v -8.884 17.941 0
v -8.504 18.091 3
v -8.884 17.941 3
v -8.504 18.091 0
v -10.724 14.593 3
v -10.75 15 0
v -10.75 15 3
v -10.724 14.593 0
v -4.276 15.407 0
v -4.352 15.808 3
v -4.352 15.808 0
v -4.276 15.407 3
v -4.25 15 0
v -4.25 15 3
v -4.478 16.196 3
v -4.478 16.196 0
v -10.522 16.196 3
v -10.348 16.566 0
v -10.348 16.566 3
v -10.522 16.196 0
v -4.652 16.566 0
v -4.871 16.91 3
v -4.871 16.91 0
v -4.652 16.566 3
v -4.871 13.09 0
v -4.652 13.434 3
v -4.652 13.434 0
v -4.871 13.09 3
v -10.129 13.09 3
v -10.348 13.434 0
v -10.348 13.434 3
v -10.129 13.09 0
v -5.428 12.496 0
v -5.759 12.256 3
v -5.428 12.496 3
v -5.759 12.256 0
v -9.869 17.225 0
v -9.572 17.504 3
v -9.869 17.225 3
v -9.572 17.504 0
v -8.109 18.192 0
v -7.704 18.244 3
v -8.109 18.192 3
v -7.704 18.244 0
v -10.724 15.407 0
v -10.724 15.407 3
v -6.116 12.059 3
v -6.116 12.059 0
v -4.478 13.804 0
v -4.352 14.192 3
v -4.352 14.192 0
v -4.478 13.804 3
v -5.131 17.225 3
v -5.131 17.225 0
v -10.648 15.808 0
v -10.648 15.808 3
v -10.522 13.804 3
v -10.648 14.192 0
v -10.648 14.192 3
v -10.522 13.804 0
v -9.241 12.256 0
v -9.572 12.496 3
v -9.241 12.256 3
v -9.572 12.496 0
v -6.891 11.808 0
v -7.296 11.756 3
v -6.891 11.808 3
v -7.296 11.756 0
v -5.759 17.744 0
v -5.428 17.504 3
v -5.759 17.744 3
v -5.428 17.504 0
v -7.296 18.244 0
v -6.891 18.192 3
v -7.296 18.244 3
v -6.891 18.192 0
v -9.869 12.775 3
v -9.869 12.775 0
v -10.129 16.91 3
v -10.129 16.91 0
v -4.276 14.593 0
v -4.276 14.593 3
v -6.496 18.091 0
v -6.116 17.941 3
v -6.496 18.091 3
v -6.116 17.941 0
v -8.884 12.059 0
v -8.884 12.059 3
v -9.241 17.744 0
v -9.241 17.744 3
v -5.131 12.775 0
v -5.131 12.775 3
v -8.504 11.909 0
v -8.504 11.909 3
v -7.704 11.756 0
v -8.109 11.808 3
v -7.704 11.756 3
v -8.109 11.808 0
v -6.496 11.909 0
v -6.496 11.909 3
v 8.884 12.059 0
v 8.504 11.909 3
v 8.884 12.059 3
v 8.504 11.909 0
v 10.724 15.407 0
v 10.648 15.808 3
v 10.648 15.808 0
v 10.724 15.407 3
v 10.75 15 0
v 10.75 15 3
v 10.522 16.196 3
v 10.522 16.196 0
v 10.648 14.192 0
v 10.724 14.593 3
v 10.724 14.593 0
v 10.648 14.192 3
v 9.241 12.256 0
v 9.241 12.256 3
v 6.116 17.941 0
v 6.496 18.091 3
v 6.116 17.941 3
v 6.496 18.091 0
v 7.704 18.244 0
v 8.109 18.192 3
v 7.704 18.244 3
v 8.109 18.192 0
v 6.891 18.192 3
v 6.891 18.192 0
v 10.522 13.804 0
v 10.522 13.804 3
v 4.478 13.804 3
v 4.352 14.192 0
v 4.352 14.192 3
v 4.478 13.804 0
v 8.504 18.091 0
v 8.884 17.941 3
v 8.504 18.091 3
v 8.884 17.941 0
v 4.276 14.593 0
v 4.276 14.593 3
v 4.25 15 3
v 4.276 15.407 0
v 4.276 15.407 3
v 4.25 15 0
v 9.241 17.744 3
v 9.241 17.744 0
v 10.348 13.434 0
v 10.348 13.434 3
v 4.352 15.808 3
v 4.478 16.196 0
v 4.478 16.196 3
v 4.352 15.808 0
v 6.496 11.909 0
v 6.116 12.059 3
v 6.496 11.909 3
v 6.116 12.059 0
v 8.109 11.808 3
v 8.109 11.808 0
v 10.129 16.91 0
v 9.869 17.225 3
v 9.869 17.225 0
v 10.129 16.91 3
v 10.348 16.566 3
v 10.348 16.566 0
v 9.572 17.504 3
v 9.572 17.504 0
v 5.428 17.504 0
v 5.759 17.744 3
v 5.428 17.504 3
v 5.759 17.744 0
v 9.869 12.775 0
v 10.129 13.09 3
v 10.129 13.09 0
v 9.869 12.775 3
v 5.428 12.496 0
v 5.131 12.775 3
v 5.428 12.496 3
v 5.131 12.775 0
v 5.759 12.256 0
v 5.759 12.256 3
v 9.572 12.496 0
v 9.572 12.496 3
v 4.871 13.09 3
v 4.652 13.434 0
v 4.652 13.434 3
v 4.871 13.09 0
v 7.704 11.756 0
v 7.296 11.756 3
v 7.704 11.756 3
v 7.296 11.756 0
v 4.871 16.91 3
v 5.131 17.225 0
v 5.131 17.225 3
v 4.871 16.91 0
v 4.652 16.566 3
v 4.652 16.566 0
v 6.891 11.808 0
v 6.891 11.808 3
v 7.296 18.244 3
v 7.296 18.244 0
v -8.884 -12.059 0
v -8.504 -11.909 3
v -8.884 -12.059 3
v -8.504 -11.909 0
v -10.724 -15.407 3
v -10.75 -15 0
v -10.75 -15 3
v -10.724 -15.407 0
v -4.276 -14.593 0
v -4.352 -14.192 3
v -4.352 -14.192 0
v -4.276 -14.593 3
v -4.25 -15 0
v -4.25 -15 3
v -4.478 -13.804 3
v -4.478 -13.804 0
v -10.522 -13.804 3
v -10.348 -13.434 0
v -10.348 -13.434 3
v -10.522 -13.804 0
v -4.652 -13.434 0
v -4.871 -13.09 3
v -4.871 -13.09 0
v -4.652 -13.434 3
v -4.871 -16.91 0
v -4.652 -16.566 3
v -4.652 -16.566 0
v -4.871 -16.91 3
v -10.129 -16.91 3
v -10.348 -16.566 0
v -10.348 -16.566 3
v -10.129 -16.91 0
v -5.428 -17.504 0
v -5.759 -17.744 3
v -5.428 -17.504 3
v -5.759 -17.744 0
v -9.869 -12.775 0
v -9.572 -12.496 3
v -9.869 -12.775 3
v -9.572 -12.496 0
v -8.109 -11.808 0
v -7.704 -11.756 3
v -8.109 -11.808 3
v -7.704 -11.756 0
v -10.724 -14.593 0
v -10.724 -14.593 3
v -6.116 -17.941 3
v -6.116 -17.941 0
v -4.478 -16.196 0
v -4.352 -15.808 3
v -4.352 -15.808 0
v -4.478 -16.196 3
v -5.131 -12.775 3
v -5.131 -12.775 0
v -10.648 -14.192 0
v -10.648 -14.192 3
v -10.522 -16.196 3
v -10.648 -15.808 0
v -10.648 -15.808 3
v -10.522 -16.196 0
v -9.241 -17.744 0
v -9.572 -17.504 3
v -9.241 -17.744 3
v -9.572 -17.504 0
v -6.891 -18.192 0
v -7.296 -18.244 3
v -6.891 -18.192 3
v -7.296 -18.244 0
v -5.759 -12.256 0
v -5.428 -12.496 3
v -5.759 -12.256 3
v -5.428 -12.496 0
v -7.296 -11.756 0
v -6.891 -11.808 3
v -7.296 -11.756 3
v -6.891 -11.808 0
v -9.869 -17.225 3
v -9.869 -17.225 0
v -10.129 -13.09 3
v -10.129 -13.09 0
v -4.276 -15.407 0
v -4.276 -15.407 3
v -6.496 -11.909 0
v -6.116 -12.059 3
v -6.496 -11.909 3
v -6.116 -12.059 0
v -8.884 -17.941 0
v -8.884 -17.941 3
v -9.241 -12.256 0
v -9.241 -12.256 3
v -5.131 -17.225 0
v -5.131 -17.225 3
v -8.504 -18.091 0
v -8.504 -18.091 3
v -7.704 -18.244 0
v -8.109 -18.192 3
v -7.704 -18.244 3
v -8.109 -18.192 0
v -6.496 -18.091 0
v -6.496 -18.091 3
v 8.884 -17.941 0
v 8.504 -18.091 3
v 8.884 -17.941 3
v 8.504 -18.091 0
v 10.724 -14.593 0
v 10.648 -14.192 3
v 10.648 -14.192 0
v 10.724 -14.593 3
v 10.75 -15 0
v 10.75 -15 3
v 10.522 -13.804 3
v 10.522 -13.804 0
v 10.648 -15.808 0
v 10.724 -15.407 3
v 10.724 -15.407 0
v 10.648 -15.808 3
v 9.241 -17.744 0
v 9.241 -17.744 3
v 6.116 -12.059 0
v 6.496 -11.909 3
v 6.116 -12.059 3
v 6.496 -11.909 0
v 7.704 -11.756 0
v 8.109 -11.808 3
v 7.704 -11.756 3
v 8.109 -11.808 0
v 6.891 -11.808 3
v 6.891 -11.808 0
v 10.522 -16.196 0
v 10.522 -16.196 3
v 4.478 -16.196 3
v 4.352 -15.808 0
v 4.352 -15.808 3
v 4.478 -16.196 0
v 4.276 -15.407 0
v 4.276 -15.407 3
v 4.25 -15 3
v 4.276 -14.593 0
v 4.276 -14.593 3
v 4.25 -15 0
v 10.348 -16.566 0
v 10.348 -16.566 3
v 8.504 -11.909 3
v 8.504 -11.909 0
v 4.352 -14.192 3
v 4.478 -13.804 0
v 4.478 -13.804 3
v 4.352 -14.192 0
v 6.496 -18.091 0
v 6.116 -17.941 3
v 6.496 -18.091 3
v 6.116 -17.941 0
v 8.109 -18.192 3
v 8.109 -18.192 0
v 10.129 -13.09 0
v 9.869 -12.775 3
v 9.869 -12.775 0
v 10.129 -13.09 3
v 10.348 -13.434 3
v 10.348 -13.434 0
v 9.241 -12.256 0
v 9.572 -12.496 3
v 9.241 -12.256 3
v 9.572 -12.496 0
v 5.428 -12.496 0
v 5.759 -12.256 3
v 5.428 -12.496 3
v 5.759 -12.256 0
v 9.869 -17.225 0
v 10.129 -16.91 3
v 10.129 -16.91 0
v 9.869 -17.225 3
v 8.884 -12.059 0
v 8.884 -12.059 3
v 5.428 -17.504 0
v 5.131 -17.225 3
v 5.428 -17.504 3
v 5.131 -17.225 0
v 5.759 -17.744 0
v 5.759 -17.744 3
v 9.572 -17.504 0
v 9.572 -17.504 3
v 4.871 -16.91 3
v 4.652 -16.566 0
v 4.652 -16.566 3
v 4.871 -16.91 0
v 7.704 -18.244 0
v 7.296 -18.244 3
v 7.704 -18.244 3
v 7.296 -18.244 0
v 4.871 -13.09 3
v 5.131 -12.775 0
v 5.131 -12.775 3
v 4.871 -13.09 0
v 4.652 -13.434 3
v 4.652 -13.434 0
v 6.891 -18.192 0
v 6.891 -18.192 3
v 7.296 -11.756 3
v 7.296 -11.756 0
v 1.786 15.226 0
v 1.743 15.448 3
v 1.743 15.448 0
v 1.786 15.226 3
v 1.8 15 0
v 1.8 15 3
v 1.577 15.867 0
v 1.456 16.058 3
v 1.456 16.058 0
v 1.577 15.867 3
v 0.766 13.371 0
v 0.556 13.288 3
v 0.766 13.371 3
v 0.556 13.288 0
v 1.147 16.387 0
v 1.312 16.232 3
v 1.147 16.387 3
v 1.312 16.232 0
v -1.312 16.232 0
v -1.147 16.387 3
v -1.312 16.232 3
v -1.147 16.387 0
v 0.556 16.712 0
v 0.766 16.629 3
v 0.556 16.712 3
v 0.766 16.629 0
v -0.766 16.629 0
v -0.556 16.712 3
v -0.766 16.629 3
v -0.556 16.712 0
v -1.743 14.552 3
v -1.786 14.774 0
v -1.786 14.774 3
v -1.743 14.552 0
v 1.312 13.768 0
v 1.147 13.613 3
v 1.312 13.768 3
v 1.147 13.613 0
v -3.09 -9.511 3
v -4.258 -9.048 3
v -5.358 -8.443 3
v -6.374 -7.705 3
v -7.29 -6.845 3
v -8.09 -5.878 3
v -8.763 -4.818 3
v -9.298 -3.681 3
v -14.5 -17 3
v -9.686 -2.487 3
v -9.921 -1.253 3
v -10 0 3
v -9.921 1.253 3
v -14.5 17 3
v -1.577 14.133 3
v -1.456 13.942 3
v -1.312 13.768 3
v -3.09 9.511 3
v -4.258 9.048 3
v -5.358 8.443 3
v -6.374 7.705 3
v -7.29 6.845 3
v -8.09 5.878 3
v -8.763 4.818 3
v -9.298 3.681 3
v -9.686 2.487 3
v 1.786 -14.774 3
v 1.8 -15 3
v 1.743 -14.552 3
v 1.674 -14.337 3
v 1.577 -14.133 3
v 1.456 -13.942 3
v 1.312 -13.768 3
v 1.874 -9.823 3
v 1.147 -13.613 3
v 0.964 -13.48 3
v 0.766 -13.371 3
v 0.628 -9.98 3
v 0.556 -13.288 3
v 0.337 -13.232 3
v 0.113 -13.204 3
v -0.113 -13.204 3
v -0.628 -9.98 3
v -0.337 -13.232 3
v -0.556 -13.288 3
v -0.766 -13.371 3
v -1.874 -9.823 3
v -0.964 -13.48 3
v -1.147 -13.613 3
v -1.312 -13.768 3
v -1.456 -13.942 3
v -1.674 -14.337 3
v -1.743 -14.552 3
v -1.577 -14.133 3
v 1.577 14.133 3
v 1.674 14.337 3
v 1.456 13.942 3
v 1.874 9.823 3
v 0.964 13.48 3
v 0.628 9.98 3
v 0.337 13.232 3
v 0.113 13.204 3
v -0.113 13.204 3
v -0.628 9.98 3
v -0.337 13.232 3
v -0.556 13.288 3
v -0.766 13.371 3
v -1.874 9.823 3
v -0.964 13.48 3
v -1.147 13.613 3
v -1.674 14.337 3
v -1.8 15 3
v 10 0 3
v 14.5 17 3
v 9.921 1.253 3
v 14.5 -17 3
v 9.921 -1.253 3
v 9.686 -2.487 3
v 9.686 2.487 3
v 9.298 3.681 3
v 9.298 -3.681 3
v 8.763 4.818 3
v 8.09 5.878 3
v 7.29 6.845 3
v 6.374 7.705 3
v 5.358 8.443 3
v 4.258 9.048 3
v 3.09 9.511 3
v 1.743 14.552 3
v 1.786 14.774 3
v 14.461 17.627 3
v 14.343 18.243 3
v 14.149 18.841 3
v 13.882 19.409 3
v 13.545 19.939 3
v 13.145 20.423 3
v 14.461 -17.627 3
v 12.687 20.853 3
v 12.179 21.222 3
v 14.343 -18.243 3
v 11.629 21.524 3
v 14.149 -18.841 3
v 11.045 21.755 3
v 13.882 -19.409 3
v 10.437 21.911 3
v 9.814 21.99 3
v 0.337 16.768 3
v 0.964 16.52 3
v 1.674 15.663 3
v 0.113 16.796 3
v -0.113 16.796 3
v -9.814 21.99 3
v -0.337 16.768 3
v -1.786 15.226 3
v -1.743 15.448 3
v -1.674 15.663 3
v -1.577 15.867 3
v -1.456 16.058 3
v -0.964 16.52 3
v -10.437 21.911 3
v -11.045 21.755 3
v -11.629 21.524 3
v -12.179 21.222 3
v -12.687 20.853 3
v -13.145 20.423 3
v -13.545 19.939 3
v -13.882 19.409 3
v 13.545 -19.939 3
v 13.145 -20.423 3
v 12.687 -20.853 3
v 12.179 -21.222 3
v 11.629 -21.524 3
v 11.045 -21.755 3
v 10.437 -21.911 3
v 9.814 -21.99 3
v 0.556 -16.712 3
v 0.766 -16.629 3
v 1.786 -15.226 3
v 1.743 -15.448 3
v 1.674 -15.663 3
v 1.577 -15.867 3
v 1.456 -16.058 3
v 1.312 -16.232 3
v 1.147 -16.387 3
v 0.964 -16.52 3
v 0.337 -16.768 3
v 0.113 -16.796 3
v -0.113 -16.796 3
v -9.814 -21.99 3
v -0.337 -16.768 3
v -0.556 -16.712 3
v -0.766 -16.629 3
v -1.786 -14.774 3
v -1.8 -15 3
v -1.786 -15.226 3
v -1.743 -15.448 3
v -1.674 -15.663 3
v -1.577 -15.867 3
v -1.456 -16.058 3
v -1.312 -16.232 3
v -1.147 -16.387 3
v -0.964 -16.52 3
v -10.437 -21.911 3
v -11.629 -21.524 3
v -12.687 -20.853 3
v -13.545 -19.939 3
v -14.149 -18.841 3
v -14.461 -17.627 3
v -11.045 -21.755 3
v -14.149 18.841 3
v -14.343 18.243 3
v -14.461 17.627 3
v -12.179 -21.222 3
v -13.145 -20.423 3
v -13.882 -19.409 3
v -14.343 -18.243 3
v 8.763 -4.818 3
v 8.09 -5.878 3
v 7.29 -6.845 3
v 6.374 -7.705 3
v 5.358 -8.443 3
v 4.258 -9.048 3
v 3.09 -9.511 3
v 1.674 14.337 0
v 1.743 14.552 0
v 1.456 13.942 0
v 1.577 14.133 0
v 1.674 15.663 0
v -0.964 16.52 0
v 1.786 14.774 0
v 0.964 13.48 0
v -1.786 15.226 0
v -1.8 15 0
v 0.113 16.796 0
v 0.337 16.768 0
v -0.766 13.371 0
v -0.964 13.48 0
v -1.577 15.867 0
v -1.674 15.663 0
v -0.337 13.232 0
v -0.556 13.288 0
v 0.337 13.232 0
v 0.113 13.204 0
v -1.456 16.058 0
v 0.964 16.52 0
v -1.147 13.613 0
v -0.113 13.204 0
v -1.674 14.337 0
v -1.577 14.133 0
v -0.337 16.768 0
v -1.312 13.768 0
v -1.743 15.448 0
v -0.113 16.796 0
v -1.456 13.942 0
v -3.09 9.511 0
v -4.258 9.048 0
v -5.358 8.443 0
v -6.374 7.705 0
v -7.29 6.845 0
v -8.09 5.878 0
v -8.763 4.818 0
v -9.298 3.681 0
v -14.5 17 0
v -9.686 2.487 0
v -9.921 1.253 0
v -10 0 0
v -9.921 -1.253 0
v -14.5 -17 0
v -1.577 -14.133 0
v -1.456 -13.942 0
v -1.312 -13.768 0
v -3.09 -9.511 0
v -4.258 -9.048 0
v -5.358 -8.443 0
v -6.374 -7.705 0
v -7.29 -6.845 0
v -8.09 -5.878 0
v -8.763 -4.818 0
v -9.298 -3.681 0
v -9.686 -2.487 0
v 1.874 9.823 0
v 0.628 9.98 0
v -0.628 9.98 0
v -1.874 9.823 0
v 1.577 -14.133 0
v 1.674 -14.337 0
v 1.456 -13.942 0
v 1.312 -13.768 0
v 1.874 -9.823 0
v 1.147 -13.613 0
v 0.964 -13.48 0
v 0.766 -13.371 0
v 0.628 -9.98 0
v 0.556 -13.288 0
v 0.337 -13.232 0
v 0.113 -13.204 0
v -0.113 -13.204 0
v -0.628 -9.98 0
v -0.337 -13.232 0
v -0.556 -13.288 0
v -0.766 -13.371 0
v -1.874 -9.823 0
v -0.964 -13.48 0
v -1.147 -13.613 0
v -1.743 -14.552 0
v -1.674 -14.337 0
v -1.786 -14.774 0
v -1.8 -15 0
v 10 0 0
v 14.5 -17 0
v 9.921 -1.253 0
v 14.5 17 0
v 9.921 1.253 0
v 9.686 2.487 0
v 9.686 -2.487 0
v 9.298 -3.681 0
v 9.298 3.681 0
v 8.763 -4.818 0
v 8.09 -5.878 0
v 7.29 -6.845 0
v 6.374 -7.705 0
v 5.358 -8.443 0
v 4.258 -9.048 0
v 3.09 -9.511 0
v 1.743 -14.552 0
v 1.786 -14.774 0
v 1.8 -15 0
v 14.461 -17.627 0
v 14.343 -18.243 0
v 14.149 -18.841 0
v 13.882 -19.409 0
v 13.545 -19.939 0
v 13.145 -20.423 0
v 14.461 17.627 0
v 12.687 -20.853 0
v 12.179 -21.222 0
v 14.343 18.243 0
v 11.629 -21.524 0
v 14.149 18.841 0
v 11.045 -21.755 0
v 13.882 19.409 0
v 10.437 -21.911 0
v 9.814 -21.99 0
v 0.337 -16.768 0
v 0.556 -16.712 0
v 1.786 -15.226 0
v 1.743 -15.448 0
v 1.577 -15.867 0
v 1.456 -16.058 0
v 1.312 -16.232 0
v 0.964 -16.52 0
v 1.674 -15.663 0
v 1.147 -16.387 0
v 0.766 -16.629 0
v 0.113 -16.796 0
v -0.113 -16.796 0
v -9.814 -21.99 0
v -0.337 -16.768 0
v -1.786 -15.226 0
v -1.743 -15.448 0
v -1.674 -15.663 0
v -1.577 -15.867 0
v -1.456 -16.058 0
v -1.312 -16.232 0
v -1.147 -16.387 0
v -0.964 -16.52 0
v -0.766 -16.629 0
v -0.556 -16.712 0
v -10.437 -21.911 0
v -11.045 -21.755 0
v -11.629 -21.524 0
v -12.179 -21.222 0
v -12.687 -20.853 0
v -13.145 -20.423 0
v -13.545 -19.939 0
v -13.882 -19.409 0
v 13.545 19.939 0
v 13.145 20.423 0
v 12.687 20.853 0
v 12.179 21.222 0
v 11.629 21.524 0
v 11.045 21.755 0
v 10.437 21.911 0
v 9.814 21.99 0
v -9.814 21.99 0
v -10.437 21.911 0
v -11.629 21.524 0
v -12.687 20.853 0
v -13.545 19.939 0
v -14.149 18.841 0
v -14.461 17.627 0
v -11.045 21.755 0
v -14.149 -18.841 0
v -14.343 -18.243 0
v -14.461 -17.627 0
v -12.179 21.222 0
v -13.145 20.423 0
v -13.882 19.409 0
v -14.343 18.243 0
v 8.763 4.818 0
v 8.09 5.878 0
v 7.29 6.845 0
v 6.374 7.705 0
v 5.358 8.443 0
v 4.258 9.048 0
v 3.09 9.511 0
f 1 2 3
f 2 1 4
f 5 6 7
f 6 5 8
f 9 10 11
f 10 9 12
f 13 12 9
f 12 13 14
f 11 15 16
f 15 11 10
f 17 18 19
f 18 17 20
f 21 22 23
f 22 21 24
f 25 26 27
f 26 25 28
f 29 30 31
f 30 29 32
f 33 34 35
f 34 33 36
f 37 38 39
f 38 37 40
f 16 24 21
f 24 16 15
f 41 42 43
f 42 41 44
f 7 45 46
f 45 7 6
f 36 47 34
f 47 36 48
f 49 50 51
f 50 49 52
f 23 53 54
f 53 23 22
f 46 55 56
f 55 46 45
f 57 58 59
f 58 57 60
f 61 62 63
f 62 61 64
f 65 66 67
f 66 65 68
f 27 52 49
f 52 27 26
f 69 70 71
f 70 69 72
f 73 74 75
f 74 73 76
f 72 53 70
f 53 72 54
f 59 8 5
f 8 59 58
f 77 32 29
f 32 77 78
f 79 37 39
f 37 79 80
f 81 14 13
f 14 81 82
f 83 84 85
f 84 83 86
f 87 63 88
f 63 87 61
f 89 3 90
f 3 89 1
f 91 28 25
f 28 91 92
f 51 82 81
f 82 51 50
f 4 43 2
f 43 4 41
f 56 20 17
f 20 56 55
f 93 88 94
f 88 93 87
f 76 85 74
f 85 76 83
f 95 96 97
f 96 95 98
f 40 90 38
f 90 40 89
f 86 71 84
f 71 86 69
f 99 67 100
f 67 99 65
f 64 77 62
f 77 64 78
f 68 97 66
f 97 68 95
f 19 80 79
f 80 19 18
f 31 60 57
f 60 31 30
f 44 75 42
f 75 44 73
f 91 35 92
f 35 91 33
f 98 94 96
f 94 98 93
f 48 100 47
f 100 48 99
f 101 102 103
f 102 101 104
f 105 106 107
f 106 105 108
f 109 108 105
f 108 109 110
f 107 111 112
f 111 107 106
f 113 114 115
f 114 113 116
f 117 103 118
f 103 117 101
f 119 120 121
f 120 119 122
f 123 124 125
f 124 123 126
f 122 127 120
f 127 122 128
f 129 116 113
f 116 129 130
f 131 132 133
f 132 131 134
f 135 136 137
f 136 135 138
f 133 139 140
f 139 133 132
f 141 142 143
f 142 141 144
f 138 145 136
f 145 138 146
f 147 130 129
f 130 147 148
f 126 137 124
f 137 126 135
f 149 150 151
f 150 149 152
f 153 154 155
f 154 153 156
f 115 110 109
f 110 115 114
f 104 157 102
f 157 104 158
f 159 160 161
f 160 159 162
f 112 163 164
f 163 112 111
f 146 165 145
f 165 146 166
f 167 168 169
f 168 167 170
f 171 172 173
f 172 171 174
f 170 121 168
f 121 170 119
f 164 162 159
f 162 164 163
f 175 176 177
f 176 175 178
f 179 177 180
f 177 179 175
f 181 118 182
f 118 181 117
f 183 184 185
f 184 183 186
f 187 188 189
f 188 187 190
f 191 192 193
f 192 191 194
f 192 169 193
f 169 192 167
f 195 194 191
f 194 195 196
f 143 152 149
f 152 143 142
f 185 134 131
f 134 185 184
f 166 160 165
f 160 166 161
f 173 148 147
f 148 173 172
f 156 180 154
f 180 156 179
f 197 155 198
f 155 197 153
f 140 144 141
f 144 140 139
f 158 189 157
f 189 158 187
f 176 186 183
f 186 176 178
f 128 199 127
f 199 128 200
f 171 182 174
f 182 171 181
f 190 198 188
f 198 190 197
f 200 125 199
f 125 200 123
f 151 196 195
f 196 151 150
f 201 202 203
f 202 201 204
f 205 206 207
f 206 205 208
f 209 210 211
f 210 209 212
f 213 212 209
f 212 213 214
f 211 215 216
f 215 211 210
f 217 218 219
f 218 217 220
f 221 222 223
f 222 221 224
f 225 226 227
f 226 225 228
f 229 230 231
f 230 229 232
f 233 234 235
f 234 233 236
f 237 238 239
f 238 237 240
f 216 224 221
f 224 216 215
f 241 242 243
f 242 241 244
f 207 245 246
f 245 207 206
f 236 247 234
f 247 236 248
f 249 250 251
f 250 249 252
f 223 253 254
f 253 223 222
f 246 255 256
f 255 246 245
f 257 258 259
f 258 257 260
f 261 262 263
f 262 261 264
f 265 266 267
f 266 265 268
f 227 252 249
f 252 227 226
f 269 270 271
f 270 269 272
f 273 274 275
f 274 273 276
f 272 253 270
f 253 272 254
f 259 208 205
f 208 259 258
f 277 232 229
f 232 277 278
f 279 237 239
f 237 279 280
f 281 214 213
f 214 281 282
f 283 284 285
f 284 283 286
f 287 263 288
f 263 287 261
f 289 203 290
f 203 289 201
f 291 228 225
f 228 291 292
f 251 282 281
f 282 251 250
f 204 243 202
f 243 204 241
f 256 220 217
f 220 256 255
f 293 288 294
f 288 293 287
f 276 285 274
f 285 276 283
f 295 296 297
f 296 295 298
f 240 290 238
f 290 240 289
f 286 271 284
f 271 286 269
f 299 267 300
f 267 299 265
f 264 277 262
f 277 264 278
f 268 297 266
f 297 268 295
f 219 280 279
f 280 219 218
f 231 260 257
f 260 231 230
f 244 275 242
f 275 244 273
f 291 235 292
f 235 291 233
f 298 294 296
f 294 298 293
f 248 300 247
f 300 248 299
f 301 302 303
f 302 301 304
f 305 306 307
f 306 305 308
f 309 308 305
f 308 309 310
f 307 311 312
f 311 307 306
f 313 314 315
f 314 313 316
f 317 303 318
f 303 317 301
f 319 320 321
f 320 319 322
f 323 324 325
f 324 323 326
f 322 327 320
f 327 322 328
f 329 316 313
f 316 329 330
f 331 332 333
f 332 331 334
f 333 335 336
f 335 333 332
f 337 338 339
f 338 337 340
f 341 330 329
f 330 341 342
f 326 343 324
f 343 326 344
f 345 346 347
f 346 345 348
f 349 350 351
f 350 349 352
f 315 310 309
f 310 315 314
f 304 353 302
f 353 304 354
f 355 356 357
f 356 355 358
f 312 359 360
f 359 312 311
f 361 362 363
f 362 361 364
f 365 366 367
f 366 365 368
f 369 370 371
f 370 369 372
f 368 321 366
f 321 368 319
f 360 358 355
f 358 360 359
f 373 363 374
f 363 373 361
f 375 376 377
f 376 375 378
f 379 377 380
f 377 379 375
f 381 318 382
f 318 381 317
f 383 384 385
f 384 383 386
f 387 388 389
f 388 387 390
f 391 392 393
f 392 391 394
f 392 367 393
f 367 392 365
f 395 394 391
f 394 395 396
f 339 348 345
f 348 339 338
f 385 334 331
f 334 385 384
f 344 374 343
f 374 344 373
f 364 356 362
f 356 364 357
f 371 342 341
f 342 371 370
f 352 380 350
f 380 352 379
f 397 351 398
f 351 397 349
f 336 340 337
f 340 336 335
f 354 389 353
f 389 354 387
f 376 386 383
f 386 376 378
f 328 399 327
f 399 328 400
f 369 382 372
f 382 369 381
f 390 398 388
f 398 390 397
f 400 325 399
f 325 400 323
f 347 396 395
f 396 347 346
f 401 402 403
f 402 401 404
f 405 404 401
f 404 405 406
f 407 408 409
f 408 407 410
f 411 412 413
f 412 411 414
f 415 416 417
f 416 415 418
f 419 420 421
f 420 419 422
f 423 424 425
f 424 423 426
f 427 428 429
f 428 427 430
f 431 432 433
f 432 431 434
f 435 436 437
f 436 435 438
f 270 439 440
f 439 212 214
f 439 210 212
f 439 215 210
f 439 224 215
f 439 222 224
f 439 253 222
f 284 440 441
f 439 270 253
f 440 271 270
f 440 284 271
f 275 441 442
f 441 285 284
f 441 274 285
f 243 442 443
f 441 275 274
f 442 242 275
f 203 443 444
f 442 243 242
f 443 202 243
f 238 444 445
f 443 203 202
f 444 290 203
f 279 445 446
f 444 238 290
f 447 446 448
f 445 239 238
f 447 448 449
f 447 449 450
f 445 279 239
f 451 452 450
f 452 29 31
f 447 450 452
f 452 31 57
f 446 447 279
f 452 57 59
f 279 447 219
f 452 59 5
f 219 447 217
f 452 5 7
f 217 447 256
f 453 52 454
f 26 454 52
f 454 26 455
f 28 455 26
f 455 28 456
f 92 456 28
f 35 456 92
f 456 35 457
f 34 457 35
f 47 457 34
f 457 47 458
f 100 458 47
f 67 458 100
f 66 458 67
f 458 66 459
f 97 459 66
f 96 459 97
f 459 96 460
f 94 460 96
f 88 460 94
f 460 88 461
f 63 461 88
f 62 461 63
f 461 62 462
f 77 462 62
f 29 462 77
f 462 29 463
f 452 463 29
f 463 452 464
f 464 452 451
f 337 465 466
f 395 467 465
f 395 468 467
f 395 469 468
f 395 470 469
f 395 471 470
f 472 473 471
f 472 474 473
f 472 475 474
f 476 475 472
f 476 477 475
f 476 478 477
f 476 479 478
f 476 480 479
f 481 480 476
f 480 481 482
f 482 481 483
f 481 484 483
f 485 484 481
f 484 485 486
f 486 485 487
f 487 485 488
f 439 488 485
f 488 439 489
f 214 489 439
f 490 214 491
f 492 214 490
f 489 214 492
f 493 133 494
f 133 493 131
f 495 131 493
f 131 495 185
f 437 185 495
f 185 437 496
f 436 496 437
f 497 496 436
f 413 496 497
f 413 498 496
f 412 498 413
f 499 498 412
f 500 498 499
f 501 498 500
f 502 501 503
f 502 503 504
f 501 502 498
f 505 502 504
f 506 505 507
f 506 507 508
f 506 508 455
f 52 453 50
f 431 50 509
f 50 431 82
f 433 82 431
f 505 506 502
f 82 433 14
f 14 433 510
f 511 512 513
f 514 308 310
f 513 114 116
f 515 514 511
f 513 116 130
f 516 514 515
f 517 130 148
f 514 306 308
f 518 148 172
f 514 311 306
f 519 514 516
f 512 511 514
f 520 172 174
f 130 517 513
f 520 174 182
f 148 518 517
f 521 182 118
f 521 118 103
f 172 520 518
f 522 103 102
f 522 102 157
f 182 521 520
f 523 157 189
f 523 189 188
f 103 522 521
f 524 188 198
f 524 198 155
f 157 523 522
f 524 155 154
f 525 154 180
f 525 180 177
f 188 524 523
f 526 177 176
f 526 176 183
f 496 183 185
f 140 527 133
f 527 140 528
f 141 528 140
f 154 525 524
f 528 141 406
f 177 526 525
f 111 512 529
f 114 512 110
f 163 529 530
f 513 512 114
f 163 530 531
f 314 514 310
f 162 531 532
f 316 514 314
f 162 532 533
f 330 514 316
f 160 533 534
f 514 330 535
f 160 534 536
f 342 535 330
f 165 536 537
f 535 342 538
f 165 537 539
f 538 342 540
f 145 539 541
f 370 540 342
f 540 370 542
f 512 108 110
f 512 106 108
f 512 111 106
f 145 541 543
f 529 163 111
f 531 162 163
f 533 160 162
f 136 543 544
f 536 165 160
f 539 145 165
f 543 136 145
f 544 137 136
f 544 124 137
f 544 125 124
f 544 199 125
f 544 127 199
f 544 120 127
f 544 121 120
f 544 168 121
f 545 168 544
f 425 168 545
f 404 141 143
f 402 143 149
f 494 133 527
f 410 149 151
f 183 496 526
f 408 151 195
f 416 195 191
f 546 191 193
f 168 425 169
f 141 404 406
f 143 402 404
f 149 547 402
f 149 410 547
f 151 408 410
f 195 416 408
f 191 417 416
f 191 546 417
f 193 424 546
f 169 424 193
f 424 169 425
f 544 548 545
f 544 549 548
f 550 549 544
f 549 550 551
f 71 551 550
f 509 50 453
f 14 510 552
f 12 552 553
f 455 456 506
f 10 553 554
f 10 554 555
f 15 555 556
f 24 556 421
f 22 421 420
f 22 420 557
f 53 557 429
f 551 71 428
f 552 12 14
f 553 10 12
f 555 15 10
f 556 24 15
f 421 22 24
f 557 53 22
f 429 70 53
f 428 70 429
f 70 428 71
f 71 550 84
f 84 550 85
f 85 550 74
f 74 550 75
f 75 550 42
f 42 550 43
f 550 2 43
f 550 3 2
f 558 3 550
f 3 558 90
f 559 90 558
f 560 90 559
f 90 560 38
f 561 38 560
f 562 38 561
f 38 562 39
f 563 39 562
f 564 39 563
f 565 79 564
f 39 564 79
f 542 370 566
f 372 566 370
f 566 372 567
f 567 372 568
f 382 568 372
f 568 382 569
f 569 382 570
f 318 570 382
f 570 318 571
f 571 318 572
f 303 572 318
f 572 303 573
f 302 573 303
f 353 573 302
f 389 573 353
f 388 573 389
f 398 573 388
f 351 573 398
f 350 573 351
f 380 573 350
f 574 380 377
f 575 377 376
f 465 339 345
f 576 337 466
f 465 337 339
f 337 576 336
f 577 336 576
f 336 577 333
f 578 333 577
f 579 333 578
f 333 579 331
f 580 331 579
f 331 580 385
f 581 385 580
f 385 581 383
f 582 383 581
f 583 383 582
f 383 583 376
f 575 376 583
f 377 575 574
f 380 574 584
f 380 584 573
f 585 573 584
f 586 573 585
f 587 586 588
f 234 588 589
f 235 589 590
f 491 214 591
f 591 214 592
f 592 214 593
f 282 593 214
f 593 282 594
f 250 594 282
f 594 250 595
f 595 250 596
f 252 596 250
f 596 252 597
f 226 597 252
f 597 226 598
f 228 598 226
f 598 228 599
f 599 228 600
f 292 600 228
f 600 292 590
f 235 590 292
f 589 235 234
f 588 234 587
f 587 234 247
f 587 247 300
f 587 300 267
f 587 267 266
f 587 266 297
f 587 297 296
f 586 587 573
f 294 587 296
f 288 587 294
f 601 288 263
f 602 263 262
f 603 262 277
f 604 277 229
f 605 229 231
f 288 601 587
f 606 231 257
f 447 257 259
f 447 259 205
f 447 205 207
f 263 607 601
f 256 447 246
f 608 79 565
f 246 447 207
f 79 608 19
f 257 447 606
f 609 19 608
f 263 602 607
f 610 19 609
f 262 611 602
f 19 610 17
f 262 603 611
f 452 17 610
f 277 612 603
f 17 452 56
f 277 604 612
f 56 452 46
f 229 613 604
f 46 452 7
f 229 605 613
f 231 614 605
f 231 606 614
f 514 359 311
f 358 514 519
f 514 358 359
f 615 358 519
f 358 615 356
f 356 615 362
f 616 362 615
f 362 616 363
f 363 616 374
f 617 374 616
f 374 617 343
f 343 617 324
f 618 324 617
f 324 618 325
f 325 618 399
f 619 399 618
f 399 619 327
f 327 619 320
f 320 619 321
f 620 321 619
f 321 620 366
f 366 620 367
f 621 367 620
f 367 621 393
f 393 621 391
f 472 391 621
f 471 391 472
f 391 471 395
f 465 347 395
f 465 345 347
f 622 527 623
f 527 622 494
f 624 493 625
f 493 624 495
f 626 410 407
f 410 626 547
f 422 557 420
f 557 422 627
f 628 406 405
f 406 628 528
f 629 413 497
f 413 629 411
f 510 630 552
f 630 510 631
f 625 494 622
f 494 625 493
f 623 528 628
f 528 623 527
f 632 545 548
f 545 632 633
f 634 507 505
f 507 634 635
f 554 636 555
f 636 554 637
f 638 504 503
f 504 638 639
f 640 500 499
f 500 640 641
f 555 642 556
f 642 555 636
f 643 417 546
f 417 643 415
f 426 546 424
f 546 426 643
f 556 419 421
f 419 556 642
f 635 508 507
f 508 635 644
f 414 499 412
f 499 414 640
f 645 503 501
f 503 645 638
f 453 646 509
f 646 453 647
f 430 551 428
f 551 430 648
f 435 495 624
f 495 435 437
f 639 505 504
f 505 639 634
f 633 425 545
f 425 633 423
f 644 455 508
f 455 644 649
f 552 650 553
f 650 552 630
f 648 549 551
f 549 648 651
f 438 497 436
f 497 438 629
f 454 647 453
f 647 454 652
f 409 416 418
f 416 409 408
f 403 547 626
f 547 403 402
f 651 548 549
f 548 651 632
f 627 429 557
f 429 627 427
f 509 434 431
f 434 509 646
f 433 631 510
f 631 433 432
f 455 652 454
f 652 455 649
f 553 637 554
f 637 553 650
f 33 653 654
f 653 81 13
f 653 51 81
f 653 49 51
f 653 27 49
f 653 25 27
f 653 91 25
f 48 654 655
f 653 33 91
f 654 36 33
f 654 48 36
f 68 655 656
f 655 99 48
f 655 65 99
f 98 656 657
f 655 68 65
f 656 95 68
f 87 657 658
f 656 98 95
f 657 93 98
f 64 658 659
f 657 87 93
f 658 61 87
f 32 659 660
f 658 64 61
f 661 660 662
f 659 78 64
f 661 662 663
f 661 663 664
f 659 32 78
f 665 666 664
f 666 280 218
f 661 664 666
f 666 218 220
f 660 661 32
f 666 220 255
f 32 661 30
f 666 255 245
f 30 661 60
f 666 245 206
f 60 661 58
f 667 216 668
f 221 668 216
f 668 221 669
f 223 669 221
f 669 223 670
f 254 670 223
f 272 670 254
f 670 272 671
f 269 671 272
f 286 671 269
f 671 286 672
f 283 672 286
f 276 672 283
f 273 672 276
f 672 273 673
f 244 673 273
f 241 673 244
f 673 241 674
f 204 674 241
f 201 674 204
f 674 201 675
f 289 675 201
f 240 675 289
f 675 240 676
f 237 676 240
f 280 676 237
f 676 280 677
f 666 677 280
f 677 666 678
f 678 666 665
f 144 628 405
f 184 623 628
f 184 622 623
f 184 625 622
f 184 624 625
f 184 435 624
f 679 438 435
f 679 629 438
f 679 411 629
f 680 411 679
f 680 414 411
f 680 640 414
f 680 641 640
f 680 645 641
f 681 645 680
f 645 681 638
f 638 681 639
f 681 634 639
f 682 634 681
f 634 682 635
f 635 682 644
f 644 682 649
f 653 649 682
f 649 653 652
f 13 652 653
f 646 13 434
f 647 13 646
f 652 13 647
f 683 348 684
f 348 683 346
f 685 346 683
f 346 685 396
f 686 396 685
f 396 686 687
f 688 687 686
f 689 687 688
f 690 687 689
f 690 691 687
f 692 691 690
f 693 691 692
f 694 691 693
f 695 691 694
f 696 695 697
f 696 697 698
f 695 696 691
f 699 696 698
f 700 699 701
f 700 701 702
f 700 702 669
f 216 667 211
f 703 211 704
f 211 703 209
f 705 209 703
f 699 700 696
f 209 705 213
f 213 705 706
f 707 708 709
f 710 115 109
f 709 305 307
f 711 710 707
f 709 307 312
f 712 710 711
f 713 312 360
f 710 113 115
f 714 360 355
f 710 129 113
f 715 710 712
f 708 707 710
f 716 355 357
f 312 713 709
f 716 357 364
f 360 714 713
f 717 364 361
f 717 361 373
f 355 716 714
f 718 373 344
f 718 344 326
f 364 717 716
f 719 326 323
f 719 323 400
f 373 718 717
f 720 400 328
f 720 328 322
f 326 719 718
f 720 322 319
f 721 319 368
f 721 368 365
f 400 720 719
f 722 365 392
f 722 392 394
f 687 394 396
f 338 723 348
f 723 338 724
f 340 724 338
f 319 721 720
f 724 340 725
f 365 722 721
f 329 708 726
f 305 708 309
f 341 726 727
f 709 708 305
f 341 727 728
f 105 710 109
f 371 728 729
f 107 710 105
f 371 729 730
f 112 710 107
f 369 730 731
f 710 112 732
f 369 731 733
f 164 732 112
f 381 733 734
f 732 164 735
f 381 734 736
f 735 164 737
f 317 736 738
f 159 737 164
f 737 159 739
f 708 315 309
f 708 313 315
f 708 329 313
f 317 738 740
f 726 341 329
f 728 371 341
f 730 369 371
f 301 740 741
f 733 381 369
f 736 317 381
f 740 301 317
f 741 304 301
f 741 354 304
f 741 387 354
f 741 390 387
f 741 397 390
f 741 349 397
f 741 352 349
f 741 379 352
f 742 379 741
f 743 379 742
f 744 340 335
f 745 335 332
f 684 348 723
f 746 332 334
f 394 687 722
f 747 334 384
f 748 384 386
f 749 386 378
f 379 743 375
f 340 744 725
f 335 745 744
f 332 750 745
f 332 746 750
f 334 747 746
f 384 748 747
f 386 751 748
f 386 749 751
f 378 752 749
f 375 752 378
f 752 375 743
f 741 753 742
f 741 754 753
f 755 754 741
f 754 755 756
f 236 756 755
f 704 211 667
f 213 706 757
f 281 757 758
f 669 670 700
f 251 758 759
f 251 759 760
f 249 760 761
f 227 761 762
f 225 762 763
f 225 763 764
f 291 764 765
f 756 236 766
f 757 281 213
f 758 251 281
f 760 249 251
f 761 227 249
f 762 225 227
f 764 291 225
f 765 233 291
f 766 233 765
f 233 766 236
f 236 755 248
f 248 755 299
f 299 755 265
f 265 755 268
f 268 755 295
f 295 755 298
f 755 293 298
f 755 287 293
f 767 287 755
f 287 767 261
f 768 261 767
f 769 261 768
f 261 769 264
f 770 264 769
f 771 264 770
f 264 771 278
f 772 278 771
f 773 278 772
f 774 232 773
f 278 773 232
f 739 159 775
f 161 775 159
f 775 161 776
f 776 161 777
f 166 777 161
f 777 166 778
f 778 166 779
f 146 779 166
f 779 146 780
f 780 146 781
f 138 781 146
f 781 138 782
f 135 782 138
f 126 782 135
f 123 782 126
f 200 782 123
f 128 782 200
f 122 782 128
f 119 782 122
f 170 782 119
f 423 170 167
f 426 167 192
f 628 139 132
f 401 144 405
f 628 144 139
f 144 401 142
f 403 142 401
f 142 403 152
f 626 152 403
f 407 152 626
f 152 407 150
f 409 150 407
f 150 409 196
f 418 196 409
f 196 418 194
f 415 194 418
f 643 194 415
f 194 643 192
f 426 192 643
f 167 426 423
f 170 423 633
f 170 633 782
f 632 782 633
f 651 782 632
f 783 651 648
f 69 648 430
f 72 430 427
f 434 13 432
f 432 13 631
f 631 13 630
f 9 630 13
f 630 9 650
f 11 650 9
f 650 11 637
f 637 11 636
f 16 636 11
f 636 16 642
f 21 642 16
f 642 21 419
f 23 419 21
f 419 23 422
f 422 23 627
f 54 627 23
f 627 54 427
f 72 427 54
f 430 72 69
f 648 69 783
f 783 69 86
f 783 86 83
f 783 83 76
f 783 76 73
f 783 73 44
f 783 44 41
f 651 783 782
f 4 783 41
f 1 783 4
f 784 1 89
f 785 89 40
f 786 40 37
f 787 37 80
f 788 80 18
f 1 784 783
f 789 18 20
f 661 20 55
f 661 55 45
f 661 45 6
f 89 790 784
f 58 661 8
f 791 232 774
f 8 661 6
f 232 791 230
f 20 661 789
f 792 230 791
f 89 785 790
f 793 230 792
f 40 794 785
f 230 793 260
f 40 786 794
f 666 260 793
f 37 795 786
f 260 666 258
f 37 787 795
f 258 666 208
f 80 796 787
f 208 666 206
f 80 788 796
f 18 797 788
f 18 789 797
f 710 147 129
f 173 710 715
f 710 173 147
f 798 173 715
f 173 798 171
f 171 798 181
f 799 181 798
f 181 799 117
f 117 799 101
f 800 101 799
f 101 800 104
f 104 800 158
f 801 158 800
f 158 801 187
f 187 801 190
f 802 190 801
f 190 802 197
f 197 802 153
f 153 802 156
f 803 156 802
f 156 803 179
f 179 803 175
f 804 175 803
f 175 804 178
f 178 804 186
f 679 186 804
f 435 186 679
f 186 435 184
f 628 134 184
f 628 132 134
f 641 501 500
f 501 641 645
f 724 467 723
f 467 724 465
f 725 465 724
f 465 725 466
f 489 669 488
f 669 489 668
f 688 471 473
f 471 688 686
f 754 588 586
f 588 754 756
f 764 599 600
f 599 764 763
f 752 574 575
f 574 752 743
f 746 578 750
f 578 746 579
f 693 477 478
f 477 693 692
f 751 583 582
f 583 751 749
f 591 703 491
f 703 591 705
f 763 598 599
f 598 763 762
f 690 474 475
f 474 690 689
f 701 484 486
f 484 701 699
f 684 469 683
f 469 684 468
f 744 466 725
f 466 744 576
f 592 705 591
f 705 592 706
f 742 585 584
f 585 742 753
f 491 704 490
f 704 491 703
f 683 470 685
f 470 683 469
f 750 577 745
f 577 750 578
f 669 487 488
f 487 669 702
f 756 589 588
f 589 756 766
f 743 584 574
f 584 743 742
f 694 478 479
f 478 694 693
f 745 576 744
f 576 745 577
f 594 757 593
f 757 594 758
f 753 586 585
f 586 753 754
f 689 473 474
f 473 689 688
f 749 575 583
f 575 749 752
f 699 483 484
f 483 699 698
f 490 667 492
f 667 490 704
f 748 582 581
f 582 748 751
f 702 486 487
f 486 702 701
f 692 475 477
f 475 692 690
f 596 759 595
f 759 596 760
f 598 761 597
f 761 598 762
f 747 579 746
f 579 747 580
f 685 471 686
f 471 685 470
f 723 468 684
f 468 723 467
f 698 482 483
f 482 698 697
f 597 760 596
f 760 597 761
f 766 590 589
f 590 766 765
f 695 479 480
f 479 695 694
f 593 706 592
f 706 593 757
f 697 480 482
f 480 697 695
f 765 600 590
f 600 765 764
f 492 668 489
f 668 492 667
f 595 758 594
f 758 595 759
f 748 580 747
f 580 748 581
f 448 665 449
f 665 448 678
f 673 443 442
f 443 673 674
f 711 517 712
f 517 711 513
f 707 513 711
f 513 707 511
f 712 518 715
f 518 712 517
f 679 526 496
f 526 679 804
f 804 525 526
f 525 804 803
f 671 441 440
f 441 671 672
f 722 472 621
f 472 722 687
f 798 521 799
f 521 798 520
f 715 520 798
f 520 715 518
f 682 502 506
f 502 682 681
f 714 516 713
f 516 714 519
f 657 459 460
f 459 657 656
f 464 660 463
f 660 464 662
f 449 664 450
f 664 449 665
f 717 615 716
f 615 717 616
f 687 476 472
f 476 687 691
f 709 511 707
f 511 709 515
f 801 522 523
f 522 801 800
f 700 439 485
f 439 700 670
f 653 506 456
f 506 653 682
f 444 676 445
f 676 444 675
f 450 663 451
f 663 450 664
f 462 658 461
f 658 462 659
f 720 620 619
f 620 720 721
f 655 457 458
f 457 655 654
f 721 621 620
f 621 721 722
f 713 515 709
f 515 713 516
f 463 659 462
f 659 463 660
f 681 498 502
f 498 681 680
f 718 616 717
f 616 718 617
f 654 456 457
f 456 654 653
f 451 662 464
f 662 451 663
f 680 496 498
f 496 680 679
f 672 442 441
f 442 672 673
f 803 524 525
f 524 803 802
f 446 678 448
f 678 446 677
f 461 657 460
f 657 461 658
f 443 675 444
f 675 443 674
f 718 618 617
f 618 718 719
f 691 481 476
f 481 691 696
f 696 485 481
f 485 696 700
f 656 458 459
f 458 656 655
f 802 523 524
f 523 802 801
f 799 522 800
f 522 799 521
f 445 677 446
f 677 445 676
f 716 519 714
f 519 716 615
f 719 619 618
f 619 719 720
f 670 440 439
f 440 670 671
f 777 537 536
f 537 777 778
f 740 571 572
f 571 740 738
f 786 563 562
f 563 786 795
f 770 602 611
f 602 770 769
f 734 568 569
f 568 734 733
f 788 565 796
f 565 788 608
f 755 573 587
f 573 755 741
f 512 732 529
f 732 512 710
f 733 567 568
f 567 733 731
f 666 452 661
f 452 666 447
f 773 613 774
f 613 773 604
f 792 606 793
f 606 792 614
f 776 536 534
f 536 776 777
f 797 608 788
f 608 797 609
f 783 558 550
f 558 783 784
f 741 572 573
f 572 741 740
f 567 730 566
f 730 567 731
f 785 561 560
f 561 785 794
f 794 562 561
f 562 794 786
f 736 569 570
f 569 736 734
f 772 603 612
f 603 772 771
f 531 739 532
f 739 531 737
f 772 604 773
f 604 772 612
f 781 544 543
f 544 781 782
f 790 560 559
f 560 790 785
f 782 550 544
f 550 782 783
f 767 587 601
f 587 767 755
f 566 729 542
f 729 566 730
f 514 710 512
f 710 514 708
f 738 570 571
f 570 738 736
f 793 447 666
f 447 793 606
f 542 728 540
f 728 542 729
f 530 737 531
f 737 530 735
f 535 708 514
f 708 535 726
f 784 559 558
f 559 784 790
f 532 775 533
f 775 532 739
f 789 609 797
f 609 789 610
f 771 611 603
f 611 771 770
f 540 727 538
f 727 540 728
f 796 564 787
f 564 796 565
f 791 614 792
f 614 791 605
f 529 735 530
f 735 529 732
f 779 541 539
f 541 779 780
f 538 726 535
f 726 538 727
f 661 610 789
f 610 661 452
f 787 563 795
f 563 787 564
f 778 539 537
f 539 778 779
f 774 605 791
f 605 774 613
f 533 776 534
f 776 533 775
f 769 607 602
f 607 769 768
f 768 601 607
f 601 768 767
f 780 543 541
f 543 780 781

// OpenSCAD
$fn = 50;


difference() {
	union() {
		hull() {
			translate(v = [-9.5000000000, 17.0000000000, 0]) {
				cylinder(h = 3, r = 5);
			}
			translate(v = [9.5000000000, 17.0000000000, 0]) {
				cylinder(h = 3, r = 5);
			}
			translate(v = [-9.5000000000, -17.0000000000, 0]) {
				cylinder(h = 3, r = 5);
			}
			translate(v = [9.5000000000, -17.0000000000, 0]) {
				cylinder(h = 3, r = 5);
			}
		}
	}
	union() {
		#translate(v = [-7.5000000000, 15.0000000000, 0]) {
			cylinder(h = 3, r = 3.2500000000);
		}
		#translate(v = [7.5000000000, 15.0000000000, 0]) {
			cylinder(h = 3, r = 3.2500000000);
		}
		#translate(v = [-7.5000000000, -15.0000000000, 0]) {
			cylinder(h = 3, r = 3.2500000000);
		}
		#translate(v = [7.5000000000, -15.0000000000, 0]) {
			cylinder(h = 3, r = 3.2500000000);
		}
		#translate(v = [-7.5000000000, -15.0000000000, -100.0000000000]) {
			cylinder(h = 200, r = 3.2500000000);
		}
		#translate(v = [-7.5000000000, 15.0000000000, -100.0000000000]) {
			cylinder(h = 200, r = 3.2500000000);
		}
		#translate(v = [7.5000000000, -15.0000000000, -100.0000000000]) {
			cylinder(h = 200, r = 3.2500000000);
		}
		#translate(v = [7.5000000000, 15.0000000000, -100.0000000000]) {
			cylinder(h = 200, r = 3.2500000000);
		}
		#translate(v = [-7.5000000000, 15.0000000000, 0]) {
			cylinder(h = 3, r = 1.8000000000);
		}
		#translate(v = [0.0000000000, 15.0000000000, 0]) {
			cylinder(h = 3, r = 1.8000000000);
		}
		#translate(v = [7.5000000000, 15.0000000000, 0]) {
			cylinder(h = 3, r = 1.8000000000);
		}
		#translate(v = [-7.5000000000, -15.0000000000, 0]) {
			cylinder(h = 3, r = 1.8000000000);
		}
		#translate(v = [0.0000000000, -15.0000000000, 0]) {
			cylinder(h = 3, r = 1.8000000000);
		}
		#translate(v = [7.5000000000, -15.0000000000, 0]) {
			cylinder(h = 3, r = 1.8000000000);
		}
		#translate(v = [-7.5000000000, 15.0000000000, 0]) {
			cylinder(h = 3, r = 1.8000000000);
		}
		#translate(v = [0.0000000000, 15.0000000000, 0]) {
			cylinder(h = 3, r = 1.8000000000);
		}
		#translate(v = [7.5000000000, 15.0000000000, 0]) {
			cylinder(h = 3, r = 1.8000000000);
		}
		#translate(v = [-7.5000000000, -15.0000000000, 0]) {
			cylinder(h = 3, r = 1.8000000000);
		}
		#translate(v = [0.0000000000, -15.0000000000, 0]) {
			cylinder(h = 3, r = 1.8000000000);
		}
		#translate(v = [7.5000000000, -15.0000000000, 0]) {
			cylinder(h = 3, r = 1.8000000000);
		}
		#translate(v = [-7.5000000000, 15.0000000000, 0]) {
			cylinder(h = 3, r = 1.8000000000);
		}
		#translate(v = [0.0000000000, 15.0000000000, 0]) {
			cylinder(h = 3, r = 1.8000000000);
		}
		#translate(v = [7.5000000000, 15.0000000000, 0]) {
			cylinder(h = 3, r = 1.8000000000);
		}
		#translate(v = [-7.5000000000, -15.0000000000, 0]) {
			cylinder(h = 3, r = 1.8000000000);
		}
		#translate(v = [0.0000000000, -15.0000000000, 0]) {
			cylinder(h = 3, r = 1.8000000000);
		}
		#translate(v = [7.5000000000, -15.0000000000, 0]) {
			cylinder(h = 3, r = 1.8000000000);
		}
		#cylinder(h = 3, r = 10.0000000000);
	}
}
